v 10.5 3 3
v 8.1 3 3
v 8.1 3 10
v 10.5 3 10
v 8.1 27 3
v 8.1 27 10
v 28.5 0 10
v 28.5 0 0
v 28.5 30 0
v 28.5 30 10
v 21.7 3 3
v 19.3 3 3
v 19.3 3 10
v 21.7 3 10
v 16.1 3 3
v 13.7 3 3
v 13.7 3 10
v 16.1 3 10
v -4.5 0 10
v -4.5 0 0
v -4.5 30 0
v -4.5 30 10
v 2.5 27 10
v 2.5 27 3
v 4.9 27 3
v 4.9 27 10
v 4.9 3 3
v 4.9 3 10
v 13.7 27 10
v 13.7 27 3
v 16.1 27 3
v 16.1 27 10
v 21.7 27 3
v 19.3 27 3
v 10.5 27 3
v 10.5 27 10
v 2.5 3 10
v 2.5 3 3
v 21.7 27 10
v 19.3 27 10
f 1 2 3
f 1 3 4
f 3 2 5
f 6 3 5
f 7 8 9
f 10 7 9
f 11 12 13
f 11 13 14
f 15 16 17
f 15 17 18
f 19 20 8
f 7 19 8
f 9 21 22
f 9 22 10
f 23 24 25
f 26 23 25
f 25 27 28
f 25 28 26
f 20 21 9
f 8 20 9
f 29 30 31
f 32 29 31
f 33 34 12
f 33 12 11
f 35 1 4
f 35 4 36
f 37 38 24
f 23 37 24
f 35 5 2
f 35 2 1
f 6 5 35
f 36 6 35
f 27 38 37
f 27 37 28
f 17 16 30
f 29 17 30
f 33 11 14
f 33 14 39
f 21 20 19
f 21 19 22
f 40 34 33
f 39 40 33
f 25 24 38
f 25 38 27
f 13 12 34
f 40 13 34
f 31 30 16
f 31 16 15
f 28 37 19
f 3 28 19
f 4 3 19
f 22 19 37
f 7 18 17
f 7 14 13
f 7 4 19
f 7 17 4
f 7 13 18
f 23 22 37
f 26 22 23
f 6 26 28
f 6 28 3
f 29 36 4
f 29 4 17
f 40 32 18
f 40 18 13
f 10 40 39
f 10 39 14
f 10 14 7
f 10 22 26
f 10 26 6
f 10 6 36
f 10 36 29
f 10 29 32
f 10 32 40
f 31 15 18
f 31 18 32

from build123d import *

# Parameters (mm, degrees)
BOX001_W     = 2.4
BOX001_H     = 24
BOX001_DEPTH = 22
BOX002_W     = 2.4
BOX002_H     = 24
BOX002_DEPTH = 22
BOX003_W     = 2.4
BOX003_H     = 24
BOX003_DEPTH = 22
BOX_W        = 2.4
BOX_H        = 24
BOX_DEPTH    = 22
BOX004_W     = 33
BOX004_H     = 30
BOX004_DEPTH = 10


with BuildPart() as cube001:
    # Box001 → Box001 (new body)
    with BuildSketch(Plane(origin=(8.1, 3, 0), x_dir=(1, 0, 0), z_dir=(0, 0, 1))):
        with Locations((1.2, 12)):
            Rectangle(BOX001_W, BOX001_H)
    extrude(amount=BOX001_DEPTH)


with BuildPart() as cube002:
    # Box002 → Box002 (new body)
    with BuildSketch(Plane(origin=(13.7, 3, 0), x_dir=(1, 0, 0), z_dir=(0, 0, 1))):
        with Locations((1.2, 12)):
            Rectangle(BOX002_W, BOX002_H)
    extrude(amount=BOX002_DEPTH)


with BuildPart() as cube003:
    # Box003 → Box003 (new body)
    with BuildSketch(Plane(origin=(19.3, 3, 0), x_dir=(1, 0, 0), z_dir=(0, 0, 1))):
        with Locations((1.2, 12)):
            Rectangle(BOX003_W, BOX003_H)
    extrude(amount=BOX003_DEPTH)


with BuildPart() as fusion:
    # Box → Box (new body)
    with BuildSketch(Plane(origin=(2.5, 3, 0), x_dir=(1, 0, 0), z_dir=(0, 0, 1))):
        with Locations((1.2, 12)):
            Rectangle(BOX_W, BOX_H)
    extrude(amount=BOX_DEPTH)

    # Fusion: union Cube001, Cube002, Cube003
    add(cube001.part)
    add(cube002.part)
    add(cube003.part)


with BuildPart() as fusion_1:
    # Fusion placement: moved
    add(fusion.part.moved(Location((0, 0, 3))))


with BuildPart() as cut:
    # Box004 → Box004 (new body)
    with BuildSketch(Plane(origin=(-4.5, 0, 0), x_dir=(1, 0, 0), z_dir=(0, 0, 1))):
        with Locations((16.5, 15)):
            Rectangle(BOX004_W, BOX004_H)
    extrude(amount=BOX004_DEPTH)

    # Cut: cut Fusion
    add(fusion_1.part, mode=Mode.SUBTRACT)


solid = cut.part
